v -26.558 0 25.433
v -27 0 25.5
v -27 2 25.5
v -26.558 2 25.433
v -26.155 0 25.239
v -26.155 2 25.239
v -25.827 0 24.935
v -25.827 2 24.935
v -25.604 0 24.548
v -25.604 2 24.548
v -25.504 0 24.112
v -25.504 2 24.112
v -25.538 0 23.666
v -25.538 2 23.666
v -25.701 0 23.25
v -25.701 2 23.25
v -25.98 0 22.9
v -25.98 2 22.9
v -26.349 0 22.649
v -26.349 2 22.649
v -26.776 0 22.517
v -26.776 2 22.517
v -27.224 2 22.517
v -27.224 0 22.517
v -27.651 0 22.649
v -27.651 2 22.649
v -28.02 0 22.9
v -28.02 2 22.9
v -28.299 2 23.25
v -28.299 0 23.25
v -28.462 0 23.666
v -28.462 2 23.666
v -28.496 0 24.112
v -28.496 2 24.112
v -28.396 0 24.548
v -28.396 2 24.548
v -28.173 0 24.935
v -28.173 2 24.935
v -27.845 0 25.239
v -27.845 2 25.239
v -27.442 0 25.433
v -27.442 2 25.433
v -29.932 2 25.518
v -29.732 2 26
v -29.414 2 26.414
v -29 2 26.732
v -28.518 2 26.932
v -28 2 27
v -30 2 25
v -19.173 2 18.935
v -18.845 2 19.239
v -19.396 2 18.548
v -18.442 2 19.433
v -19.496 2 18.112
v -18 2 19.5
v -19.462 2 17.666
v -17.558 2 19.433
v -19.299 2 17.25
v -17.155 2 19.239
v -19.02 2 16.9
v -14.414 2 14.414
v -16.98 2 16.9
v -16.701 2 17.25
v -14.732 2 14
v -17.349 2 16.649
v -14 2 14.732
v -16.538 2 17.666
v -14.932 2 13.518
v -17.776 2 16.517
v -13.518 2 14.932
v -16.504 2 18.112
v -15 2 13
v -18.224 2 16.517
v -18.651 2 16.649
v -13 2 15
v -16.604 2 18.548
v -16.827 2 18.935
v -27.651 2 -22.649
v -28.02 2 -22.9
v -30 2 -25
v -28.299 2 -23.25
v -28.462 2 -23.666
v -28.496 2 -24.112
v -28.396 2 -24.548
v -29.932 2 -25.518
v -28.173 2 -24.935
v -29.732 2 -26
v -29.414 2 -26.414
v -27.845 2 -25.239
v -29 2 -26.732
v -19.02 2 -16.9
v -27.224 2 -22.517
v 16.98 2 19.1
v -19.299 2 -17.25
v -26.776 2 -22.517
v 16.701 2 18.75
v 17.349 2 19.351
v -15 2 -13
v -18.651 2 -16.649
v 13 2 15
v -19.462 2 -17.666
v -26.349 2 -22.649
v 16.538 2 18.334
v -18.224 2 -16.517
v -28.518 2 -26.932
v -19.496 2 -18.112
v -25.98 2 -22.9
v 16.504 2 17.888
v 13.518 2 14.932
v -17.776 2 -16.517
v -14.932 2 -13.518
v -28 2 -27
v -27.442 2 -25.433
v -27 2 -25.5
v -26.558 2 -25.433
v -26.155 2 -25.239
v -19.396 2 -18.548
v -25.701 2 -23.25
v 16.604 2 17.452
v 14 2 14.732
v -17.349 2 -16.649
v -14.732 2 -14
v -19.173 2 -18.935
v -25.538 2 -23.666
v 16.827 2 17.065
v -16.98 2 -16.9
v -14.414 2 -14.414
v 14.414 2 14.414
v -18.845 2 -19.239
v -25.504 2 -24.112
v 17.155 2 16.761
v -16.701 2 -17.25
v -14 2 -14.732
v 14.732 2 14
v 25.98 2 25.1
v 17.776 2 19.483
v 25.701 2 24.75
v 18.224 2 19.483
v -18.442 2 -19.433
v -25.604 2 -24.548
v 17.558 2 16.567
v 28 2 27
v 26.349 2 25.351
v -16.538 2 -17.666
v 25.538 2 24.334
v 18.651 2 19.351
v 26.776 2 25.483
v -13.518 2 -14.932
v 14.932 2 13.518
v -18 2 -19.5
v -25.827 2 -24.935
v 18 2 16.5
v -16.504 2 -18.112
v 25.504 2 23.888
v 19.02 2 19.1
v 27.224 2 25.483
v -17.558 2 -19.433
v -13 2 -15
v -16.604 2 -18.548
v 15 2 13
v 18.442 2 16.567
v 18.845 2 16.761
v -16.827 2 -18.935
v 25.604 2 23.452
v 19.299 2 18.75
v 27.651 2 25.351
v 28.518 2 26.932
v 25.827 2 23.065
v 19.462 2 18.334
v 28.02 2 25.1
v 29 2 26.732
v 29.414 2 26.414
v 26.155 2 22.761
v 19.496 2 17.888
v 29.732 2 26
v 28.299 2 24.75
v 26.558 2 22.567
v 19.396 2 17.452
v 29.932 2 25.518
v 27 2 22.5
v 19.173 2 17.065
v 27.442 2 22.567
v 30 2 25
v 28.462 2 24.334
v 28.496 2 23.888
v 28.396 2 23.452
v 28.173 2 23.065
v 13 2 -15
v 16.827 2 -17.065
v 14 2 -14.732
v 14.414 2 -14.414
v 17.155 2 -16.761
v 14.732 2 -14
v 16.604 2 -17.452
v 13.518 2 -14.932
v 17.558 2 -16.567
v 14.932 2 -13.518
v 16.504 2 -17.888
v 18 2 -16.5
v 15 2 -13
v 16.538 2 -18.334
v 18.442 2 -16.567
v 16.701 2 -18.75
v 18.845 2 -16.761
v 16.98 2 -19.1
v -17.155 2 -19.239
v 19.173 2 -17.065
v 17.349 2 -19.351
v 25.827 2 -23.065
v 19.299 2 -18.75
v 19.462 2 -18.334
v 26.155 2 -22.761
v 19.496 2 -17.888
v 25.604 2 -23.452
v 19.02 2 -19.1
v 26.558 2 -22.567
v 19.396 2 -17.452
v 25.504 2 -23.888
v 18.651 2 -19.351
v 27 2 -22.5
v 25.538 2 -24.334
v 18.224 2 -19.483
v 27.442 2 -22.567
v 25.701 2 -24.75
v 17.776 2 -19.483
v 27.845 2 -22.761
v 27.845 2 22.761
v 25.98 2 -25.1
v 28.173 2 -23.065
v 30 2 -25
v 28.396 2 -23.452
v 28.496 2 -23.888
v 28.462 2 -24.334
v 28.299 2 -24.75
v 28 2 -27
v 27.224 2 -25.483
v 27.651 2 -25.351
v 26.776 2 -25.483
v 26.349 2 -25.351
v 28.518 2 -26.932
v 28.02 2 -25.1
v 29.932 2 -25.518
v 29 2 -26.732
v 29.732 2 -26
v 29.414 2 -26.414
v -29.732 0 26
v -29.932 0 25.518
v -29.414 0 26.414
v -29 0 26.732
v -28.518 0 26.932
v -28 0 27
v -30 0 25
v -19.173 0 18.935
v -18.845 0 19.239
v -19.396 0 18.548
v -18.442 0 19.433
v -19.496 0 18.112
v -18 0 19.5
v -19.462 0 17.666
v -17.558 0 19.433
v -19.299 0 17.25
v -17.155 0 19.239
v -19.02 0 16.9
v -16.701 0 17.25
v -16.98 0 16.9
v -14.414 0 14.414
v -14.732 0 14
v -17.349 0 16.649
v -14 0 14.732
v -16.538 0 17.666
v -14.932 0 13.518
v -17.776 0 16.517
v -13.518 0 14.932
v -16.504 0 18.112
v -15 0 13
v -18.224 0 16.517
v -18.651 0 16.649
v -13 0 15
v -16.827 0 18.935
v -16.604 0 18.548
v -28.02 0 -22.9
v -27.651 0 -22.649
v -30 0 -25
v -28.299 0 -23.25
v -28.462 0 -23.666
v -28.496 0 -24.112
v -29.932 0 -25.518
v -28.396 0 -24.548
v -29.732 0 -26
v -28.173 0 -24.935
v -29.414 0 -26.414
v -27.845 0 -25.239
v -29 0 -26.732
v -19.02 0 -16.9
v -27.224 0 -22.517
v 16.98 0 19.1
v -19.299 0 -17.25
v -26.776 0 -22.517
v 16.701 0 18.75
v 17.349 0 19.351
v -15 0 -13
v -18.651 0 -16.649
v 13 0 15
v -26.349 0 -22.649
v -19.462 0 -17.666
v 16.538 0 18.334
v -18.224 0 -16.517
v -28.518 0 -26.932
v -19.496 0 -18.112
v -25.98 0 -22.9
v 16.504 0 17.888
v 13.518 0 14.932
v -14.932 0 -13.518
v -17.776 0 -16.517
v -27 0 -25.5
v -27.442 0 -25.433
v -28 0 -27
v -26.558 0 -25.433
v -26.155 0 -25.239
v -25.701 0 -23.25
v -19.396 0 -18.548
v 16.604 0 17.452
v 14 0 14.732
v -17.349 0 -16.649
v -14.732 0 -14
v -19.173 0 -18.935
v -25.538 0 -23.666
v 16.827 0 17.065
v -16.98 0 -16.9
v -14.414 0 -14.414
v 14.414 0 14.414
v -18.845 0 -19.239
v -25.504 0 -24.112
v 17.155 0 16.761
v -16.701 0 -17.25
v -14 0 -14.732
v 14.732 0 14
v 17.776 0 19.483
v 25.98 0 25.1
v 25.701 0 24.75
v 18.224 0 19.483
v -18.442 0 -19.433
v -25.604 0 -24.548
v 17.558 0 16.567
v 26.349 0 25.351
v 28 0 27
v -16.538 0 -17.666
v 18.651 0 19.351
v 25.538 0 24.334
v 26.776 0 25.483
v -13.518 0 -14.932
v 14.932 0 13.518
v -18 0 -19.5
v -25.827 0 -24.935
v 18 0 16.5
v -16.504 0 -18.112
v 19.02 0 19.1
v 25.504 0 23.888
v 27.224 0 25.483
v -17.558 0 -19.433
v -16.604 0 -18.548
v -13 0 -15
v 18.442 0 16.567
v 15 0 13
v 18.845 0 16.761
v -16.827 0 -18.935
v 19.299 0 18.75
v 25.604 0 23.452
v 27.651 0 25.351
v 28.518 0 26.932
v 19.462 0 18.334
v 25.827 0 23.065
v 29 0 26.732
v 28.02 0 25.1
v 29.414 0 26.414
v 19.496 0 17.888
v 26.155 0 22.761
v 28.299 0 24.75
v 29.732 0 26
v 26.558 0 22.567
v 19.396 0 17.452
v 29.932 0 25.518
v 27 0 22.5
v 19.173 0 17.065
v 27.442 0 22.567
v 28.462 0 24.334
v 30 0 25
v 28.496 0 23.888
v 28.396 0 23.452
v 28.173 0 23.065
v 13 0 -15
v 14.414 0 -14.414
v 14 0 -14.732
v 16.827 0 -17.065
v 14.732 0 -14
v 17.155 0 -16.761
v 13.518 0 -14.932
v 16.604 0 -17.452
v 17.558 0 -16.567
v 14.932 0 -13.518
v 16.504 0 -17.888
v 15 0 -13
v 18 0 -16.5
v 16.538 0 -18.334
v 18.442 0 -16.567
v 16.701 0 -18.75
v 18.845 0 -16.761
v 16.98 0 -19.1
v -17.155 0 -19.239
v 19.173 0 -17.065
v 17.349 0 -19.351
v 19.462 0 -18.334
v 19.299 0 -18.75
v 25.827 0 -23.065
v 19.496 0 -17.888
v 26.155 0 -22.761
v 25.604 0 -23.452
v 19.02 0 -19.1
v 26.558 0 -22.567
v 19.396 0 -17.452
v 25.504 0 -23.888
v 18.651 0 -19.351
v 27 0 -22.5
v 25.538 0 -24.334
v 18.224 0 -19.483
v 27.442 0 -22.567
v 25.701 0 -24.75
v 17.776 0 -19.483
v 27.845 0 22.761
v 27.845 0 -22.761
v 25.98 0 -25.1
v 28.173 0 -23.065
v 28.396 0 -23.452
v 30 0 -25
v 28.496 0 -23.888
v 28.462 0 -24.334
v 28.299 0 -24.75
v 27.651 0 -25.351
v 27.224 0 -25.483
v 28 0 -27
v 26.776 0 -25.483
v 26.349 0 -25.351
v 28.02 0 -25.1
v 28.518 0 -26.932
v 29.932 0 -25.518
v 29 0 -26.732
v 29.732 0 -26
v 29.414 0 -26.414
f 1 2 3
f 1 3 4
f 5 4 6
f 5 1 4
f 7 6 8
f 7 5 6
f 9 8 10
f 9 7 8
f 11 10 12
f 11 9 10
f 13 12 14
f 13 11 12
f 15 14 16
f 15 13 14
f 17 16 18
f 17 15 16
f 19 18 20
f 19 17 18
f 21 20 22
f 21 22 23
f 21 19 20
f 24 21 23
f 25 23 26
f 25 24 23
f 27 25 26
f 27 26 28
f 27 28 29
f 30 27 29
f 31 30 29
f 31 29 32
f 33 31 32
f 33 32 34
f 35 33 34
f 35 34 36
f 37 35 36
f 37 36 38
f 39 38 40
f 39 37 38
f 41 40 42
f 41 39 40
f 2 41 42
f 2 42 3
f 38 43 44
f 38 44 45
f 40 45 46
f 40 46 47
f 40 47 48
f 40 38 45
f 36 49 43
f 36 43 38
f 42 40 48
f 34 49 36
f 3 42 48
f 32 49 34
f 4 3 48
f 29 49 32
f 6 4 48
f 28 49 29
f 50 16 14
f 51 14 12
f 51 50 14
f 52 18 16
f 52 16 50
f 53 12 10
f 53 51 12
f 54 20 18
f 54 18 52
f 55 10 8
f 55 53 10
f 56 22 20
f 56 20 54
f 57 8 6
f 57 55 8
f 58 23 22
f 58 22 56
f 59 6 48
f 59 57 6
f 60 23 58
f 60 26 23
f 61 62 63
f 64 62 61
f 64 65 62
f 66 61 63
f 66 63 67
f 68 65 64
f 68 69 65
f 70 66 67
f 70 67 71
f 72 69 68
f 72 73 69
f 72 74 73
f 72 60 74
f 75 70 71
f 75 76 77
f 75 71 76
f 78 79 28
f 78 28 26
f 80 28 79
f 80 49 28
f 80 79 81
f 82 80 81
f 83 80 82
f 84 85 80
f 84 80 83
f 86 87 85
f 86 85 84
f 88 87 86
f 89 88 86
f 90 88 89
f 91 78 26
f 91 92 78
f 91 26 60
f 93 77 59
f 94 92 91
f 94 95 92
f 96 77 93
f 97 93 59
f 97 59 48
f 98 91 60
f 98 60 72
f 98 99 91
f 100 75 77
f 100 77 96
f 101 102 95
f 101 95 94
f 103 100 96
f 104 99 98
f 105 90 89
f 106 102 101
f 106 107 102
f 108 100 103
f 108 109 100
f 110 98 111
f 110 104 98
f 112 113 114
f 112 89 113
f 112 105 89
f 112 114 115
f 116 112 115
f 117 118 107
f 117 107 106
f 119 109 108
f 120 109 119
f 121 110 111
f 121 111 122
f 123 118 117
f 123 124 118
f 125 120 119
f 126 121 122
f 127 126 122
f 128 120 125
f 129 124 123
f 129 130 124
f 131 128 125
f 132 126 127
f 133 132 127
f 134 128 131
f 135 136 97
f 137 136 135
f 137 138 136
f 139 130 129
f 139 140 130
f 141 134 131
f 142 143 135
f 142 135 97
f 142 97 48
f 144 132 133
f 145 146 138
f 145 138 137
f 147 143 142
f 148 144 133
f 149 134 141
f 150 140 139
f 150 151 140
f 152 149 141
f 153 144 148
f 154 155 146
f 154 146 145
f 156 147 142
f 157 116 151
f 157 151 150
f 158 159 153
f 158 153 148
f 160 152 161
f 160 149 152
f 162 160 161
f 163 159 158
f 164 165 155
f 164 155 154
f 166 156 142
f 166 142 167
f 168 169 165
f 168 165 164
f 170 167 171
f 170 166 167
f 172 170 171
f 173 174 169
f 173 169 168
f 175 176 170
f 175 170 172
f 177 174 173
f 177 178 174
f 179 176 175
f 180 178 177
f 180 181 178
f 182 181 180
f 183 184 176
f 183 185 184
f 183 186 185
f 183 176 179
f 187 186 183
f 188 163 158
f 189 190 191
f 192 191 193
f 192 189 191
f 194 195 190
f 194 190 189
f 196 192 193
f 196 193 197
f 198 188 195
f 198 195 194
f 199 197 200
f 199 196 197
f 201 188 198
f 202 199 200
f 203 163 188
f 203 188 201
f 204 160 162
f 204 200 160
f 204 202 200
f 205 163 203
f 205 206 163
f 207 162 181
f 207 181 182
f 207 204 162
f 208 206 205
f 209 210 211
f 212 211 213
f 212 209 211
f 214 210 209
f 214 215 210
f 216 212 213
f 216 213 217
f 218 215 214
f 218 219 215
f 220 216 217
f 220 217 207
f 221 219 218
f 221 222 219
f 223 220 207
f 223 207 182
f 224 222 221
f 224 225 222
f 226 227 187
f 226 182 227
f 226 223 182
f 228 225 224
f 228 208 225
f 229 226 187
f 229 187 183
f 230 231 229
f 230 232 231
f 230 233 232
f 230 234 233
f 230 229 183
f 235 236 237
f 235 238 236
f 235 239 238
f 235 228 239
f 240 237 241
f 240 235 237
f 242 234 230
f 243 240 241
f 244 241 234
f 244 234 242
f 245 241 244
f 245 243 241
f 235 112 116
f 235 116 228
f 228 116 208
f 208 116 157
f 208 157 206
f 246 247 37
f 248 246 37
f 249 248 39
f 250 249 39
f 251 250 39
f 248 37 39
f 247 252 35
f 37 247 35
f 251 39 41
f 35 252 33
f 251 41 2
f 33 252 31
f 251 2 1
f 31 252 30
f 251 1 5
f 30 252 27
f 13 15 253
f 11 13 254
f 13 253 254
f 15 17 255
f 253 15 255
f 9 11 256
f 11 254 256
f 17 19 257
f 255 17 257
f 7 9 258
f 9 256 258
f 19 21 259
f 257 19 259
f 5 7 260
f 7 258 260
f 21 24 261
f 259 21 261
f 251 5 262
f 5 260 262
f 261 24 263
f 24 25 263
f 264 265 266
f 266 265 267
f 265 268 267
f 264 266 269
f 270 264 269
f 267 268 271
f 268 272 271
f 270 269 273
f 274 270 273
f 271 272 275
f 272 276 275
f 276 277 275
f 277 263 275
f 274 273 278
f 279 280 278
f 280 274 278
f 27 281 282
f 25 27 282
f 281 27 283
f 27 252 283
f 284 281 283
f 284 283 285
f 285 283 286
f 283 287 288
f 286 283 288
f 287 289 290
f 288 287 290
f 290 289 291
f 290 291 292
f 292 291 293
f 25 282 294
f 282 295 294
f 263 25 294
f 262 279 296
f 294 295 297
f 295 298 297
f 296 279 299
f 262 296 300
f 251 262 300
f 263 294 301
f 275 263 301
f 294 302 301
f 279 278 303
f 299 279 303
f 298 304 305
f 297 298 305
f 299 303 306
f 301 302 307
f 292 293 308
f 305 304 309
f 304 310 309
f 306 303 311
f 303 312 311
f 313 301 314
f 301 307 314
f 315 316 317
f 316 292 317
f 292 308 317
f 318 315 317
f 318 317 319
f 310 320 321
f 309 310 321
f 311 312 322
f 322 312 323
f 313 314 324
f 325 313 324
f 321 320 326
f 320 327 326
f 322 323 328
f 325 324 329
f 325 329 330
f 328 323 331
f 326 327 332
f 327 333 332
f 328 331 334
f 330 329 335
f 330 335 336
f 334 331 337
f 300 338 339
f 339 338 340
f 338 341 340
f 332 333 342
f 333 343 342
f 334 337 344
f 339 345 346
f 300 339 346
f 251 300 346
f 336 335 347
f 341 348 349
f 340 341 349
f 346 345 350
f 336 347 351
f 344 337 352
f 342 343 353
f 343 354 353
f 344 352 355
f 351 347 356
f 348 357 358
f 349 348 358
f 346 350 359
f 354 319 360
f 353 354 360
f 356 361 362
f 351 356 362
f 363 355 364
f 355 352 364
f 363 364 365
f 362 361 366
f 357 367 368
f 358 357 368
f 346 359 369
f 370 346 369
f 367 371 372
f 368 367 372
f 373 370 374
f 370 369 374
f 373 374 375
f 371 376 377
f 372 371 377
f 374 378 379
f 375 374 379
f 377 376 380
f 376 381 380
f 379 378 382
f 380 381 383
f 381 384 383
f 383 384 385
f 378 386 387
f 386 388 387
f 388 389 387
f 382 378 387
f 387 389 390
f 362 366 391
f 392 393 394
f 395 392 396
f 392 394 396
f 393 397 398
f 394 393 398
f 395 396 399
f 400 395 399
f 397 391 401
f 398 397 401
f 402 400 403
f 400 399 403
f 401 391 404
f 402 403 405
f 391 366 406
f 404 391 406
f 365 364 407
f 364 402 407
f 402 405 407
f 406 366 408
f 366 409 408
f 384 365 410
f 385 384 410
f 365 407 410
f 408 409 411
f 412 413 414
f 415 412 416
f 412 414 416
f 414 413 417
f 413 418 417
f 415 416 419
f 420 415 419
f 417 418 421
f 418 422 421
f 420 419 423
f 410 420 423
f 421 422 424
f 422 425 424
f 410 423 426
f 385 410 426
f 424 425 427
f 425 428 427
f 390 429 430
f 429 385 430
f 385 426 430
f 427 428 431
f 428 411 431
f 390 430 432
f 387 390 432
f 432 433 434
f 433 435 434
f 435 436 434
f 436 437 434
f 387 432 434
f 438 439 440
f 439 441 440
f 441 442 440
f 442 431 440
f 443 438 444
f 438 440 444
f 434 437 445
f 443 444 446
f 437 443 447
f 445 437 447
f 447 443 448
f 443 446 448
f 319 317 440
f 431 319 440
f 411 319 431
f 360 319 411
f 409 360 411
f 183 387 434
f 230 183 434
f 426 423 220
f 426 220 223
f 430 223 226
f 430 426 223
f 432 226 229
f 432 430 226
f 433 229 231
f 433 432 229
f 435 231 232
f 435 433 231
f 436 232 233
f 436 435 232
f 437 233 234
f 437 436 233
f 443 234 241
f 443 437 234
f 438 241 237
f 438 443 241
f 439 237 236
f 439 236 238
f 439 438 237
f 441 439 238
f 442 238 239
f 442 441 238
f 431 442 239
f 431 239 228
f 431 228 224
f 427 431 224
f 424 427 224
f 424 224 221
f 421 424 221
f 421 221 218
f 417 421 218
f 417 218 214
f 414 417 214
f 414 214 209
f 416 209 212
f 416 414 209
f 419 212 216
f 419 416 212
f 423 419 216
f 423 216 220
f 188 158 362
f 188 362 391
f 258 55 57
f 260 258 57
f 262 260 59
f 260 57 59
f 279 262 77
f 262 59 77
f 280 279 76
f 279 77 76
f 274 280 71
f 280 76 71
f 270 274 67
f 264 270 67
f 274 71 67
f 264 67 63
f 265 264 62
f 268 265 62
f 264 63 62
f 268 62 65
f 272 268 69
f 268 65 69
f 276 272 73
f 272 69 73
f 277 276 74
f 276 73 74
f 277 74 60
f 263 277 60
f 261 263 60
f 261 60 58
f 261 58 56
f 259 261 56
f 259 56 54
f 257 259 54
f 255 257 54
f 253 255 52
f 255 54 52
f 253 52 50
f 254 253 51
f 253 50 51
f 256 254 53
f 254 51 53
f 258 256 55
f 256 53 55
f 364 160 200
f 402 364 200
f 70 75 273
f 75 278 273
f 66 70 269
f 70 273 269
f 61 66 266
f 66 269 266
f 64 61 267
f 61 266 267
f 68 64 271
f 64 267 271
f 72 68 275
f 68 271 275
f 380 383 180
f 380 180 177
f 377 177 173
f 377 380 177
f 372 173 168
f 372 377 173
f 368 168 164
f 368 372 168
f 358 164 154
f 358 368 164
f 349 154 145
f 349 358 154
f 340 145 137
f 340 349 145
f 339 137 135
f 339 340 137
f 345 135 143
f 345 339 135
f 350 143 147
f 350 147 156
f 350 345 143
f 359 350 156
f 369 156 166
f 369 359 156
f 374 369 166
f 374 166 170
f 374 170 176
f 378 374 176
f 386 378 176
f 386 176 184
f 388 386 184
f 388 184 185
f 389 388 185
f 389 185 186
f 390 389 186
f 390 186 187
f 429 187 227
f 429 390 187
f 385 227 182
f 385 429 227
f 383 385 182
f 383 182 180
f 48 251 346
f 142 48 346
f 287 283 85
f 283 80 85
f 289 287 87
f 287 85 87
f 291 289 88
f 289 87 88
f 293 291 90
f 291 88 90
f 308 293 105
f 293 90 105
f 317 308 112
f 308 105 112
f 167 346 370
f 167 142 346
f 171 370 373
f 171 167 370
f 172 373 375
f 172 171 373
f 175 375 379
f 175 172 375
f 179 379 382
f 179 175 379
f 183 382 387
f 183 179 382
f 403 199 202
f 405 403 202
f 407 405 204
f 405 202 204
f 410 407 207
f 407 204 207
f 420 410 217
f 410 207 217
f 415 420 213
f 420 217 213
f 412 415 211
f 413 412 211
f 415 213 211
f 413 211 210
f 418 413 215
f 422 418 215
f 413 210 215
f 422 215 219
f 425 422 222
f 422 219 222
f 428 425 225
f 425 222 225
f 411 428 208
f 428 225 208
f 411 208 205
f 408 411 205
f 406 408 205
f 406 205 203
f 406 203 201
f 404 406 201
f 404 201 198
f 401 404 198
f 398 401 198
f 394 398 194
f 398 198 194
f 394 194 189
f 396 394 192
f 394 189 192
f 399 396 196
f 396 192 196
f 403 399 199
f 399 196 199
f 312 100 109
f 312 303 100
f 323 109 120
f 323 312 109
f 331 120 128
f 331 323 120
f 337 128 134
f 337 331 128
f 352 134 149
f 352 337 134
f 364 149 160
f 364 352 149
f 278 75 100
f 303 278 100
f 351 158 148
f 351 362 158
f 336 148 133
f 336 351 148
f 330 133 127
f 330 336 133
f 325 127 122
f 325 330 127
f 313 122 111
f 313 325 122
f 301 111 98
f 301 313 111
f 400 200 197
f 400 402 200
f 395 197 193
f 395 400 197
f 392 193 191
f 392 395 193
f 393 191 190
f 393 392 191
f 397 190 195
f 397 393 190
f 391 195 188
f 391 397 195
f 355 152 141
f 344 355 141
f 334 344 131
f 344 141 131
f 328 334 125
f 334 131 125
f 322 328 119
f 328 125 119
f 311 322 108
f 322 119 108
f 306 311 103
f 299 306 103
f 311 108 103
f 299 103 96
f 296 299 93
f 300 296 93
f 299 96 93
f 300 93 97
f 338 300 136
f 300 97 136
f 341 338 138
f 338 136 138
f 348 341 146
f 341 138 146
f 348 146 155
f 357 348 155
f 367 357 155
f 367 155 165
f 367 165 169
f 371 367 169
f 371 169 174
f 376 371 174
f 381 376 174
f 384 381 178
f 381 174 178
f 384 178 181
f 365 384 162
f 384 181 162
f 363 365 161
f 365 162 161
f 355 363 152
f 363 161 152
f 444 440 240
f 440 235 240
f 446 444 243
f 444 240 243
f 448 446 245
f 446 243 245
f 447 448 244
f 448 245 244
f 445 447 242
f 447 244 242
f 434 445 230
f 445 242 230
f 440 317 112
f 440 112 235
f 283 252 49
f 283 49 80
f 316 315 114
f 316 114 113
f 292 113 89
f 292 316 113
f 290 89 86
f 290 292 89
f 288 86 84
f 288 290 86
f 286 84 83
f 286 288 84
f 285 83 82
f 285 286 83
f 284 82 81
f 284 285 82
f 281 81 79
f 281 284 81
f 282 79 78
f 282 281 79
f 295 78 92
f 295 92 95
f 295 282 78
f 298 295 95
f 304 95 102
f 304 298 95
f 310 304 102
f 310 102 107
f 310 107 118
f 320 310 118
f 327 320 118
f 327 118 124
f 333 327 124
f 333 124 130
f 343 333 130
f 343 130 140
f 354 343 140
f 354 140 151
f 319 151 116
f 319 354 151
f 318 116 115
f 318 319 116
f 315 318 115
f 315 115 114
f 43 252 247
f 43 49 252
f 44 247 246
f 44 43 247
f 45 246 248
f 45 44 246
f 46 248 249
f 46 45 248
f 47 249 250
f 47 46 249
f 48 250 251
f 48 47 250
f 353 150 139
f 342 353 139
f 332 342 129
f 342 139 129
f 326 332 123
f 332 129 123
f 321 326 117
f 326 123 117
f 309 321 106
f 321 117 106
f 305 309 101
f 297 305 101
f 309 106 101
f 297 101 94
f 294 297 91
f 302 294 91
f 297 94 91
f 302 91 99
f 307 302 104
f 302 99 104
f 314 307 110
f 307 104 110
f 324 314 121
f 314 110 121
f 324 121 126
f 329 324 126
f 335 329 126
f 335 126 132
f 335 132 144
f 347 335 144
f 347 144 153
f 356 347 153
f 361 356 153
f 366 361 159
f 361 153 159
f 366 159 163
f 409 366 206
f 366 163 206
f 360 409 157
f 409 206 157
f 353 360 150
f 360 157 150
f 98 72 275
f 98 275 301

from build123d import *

# Parameters (mm, degrees)
SKETCH_1_W          = 60
SKETCH_1_H          = 54
SKETCH_1_R          = 1.5
EXTRUDE_1_DEPTH     = 2
SKETCH_2_R          = 1.5
CUT_EXTRUDE_1_DEPTH = 2
FILLET_1_R          = 2
SKETCH_3_W          = 30
SKETCH_3_H          = 30
CUT_EXTRUDE_2_DEPTH = 2
FILLET_2_R          = 2


with BuildPart() as part:
    # 草图1 → 凸台-拉伸1 (new body)
    with BuildSketch(Plane(origin=(0, 0, 0), x_dir=(1, 0, 0), z_dir=(0, 1, 0))):
        Rectangle(SKETCH_1_W, SKETCH_1_H)
        with Locations(Location((27, 24, 0), (0, 0, 270))):
            Circle(SKETCH_1_R, mode=Mode.SUBTRACT)
        with Locations(Location((-27, 24, 0), (0, 0, 90))):
            Circle(SKETCH_1_R, mode=Mode.SUBTRACT)
        with Locations(Location((-27, -24, 0), (0, 0, 270))):
            Circle(SKETCH_1_R, mode=Mode.SUBTRACT)
        with Locations(Location((27, -24, 0), (0, 0, 90))):
            Circle(SKETCH_1_R, mode=Mode.SUBTRACT)
    extrude(amount=EXTRUDE_1_DEPTH)

    # 草图2 → 切除-拉伸1 (cut)
    with BuildSketch(Plane(origin=(0, 2, 0), x_dir=(1, 0, 0), z_dir=(0, 1, 0))):
        with Locations(Location((18, 18, 0), (0, 0, 270))):
            Circle(SKETCH_2_R)
        with Locations(Location((-18, 18, 0), (0, 0, 90))):
            Circle(SKETCH_2_R)
        with Locations(Location((18, -18, 0), (0, 0, 90))):
            Circle(SKETCH_2_R)
        with Locations(Location((-18, -18, 0), (0, 0, 270))):
            Circle(SKETCH_2_R)
    extrude(amount=-CUT_EXTRUDE_1_DEPTH, mode=Mode.SUBTRACT)

    # 圆角1
    fillet_1_edges = [part.edges().sort_by_distance(p)[0] for p in [
        (30, 1, 27),
        (-30, 1, 27),
        (-30, 1, -27),
        (30, 1, -27),
    ]]
    fillet(fillet_1_edges, radius=FILLET_1_R)

    # 草图3 → 切除-拉伸2 (cut)
    with BuildSketch(Plane(origin=(0, 2, 0), x_dir=(1, 0, 0), z_dir=(0, 1, 0))):
        Rectangle(SKETCH_3_W, SKETCH_3_H)
    extrude(amount=-CUT_EXTRUDE_2_DEPTH, mode=Mode.SUBTRACT)

    # 圆角2
    fillet_2_edges = [part.edges().sort_by_distance(p)[0] for p in [
        (15, 1, -15),
        (15, 1, 15),
        (-15, 1, 15),
        (-15, 1, -15),
    ]]
    fillet(fillet_2_edges, radius=FILLET_2_R)


solid = part.part
